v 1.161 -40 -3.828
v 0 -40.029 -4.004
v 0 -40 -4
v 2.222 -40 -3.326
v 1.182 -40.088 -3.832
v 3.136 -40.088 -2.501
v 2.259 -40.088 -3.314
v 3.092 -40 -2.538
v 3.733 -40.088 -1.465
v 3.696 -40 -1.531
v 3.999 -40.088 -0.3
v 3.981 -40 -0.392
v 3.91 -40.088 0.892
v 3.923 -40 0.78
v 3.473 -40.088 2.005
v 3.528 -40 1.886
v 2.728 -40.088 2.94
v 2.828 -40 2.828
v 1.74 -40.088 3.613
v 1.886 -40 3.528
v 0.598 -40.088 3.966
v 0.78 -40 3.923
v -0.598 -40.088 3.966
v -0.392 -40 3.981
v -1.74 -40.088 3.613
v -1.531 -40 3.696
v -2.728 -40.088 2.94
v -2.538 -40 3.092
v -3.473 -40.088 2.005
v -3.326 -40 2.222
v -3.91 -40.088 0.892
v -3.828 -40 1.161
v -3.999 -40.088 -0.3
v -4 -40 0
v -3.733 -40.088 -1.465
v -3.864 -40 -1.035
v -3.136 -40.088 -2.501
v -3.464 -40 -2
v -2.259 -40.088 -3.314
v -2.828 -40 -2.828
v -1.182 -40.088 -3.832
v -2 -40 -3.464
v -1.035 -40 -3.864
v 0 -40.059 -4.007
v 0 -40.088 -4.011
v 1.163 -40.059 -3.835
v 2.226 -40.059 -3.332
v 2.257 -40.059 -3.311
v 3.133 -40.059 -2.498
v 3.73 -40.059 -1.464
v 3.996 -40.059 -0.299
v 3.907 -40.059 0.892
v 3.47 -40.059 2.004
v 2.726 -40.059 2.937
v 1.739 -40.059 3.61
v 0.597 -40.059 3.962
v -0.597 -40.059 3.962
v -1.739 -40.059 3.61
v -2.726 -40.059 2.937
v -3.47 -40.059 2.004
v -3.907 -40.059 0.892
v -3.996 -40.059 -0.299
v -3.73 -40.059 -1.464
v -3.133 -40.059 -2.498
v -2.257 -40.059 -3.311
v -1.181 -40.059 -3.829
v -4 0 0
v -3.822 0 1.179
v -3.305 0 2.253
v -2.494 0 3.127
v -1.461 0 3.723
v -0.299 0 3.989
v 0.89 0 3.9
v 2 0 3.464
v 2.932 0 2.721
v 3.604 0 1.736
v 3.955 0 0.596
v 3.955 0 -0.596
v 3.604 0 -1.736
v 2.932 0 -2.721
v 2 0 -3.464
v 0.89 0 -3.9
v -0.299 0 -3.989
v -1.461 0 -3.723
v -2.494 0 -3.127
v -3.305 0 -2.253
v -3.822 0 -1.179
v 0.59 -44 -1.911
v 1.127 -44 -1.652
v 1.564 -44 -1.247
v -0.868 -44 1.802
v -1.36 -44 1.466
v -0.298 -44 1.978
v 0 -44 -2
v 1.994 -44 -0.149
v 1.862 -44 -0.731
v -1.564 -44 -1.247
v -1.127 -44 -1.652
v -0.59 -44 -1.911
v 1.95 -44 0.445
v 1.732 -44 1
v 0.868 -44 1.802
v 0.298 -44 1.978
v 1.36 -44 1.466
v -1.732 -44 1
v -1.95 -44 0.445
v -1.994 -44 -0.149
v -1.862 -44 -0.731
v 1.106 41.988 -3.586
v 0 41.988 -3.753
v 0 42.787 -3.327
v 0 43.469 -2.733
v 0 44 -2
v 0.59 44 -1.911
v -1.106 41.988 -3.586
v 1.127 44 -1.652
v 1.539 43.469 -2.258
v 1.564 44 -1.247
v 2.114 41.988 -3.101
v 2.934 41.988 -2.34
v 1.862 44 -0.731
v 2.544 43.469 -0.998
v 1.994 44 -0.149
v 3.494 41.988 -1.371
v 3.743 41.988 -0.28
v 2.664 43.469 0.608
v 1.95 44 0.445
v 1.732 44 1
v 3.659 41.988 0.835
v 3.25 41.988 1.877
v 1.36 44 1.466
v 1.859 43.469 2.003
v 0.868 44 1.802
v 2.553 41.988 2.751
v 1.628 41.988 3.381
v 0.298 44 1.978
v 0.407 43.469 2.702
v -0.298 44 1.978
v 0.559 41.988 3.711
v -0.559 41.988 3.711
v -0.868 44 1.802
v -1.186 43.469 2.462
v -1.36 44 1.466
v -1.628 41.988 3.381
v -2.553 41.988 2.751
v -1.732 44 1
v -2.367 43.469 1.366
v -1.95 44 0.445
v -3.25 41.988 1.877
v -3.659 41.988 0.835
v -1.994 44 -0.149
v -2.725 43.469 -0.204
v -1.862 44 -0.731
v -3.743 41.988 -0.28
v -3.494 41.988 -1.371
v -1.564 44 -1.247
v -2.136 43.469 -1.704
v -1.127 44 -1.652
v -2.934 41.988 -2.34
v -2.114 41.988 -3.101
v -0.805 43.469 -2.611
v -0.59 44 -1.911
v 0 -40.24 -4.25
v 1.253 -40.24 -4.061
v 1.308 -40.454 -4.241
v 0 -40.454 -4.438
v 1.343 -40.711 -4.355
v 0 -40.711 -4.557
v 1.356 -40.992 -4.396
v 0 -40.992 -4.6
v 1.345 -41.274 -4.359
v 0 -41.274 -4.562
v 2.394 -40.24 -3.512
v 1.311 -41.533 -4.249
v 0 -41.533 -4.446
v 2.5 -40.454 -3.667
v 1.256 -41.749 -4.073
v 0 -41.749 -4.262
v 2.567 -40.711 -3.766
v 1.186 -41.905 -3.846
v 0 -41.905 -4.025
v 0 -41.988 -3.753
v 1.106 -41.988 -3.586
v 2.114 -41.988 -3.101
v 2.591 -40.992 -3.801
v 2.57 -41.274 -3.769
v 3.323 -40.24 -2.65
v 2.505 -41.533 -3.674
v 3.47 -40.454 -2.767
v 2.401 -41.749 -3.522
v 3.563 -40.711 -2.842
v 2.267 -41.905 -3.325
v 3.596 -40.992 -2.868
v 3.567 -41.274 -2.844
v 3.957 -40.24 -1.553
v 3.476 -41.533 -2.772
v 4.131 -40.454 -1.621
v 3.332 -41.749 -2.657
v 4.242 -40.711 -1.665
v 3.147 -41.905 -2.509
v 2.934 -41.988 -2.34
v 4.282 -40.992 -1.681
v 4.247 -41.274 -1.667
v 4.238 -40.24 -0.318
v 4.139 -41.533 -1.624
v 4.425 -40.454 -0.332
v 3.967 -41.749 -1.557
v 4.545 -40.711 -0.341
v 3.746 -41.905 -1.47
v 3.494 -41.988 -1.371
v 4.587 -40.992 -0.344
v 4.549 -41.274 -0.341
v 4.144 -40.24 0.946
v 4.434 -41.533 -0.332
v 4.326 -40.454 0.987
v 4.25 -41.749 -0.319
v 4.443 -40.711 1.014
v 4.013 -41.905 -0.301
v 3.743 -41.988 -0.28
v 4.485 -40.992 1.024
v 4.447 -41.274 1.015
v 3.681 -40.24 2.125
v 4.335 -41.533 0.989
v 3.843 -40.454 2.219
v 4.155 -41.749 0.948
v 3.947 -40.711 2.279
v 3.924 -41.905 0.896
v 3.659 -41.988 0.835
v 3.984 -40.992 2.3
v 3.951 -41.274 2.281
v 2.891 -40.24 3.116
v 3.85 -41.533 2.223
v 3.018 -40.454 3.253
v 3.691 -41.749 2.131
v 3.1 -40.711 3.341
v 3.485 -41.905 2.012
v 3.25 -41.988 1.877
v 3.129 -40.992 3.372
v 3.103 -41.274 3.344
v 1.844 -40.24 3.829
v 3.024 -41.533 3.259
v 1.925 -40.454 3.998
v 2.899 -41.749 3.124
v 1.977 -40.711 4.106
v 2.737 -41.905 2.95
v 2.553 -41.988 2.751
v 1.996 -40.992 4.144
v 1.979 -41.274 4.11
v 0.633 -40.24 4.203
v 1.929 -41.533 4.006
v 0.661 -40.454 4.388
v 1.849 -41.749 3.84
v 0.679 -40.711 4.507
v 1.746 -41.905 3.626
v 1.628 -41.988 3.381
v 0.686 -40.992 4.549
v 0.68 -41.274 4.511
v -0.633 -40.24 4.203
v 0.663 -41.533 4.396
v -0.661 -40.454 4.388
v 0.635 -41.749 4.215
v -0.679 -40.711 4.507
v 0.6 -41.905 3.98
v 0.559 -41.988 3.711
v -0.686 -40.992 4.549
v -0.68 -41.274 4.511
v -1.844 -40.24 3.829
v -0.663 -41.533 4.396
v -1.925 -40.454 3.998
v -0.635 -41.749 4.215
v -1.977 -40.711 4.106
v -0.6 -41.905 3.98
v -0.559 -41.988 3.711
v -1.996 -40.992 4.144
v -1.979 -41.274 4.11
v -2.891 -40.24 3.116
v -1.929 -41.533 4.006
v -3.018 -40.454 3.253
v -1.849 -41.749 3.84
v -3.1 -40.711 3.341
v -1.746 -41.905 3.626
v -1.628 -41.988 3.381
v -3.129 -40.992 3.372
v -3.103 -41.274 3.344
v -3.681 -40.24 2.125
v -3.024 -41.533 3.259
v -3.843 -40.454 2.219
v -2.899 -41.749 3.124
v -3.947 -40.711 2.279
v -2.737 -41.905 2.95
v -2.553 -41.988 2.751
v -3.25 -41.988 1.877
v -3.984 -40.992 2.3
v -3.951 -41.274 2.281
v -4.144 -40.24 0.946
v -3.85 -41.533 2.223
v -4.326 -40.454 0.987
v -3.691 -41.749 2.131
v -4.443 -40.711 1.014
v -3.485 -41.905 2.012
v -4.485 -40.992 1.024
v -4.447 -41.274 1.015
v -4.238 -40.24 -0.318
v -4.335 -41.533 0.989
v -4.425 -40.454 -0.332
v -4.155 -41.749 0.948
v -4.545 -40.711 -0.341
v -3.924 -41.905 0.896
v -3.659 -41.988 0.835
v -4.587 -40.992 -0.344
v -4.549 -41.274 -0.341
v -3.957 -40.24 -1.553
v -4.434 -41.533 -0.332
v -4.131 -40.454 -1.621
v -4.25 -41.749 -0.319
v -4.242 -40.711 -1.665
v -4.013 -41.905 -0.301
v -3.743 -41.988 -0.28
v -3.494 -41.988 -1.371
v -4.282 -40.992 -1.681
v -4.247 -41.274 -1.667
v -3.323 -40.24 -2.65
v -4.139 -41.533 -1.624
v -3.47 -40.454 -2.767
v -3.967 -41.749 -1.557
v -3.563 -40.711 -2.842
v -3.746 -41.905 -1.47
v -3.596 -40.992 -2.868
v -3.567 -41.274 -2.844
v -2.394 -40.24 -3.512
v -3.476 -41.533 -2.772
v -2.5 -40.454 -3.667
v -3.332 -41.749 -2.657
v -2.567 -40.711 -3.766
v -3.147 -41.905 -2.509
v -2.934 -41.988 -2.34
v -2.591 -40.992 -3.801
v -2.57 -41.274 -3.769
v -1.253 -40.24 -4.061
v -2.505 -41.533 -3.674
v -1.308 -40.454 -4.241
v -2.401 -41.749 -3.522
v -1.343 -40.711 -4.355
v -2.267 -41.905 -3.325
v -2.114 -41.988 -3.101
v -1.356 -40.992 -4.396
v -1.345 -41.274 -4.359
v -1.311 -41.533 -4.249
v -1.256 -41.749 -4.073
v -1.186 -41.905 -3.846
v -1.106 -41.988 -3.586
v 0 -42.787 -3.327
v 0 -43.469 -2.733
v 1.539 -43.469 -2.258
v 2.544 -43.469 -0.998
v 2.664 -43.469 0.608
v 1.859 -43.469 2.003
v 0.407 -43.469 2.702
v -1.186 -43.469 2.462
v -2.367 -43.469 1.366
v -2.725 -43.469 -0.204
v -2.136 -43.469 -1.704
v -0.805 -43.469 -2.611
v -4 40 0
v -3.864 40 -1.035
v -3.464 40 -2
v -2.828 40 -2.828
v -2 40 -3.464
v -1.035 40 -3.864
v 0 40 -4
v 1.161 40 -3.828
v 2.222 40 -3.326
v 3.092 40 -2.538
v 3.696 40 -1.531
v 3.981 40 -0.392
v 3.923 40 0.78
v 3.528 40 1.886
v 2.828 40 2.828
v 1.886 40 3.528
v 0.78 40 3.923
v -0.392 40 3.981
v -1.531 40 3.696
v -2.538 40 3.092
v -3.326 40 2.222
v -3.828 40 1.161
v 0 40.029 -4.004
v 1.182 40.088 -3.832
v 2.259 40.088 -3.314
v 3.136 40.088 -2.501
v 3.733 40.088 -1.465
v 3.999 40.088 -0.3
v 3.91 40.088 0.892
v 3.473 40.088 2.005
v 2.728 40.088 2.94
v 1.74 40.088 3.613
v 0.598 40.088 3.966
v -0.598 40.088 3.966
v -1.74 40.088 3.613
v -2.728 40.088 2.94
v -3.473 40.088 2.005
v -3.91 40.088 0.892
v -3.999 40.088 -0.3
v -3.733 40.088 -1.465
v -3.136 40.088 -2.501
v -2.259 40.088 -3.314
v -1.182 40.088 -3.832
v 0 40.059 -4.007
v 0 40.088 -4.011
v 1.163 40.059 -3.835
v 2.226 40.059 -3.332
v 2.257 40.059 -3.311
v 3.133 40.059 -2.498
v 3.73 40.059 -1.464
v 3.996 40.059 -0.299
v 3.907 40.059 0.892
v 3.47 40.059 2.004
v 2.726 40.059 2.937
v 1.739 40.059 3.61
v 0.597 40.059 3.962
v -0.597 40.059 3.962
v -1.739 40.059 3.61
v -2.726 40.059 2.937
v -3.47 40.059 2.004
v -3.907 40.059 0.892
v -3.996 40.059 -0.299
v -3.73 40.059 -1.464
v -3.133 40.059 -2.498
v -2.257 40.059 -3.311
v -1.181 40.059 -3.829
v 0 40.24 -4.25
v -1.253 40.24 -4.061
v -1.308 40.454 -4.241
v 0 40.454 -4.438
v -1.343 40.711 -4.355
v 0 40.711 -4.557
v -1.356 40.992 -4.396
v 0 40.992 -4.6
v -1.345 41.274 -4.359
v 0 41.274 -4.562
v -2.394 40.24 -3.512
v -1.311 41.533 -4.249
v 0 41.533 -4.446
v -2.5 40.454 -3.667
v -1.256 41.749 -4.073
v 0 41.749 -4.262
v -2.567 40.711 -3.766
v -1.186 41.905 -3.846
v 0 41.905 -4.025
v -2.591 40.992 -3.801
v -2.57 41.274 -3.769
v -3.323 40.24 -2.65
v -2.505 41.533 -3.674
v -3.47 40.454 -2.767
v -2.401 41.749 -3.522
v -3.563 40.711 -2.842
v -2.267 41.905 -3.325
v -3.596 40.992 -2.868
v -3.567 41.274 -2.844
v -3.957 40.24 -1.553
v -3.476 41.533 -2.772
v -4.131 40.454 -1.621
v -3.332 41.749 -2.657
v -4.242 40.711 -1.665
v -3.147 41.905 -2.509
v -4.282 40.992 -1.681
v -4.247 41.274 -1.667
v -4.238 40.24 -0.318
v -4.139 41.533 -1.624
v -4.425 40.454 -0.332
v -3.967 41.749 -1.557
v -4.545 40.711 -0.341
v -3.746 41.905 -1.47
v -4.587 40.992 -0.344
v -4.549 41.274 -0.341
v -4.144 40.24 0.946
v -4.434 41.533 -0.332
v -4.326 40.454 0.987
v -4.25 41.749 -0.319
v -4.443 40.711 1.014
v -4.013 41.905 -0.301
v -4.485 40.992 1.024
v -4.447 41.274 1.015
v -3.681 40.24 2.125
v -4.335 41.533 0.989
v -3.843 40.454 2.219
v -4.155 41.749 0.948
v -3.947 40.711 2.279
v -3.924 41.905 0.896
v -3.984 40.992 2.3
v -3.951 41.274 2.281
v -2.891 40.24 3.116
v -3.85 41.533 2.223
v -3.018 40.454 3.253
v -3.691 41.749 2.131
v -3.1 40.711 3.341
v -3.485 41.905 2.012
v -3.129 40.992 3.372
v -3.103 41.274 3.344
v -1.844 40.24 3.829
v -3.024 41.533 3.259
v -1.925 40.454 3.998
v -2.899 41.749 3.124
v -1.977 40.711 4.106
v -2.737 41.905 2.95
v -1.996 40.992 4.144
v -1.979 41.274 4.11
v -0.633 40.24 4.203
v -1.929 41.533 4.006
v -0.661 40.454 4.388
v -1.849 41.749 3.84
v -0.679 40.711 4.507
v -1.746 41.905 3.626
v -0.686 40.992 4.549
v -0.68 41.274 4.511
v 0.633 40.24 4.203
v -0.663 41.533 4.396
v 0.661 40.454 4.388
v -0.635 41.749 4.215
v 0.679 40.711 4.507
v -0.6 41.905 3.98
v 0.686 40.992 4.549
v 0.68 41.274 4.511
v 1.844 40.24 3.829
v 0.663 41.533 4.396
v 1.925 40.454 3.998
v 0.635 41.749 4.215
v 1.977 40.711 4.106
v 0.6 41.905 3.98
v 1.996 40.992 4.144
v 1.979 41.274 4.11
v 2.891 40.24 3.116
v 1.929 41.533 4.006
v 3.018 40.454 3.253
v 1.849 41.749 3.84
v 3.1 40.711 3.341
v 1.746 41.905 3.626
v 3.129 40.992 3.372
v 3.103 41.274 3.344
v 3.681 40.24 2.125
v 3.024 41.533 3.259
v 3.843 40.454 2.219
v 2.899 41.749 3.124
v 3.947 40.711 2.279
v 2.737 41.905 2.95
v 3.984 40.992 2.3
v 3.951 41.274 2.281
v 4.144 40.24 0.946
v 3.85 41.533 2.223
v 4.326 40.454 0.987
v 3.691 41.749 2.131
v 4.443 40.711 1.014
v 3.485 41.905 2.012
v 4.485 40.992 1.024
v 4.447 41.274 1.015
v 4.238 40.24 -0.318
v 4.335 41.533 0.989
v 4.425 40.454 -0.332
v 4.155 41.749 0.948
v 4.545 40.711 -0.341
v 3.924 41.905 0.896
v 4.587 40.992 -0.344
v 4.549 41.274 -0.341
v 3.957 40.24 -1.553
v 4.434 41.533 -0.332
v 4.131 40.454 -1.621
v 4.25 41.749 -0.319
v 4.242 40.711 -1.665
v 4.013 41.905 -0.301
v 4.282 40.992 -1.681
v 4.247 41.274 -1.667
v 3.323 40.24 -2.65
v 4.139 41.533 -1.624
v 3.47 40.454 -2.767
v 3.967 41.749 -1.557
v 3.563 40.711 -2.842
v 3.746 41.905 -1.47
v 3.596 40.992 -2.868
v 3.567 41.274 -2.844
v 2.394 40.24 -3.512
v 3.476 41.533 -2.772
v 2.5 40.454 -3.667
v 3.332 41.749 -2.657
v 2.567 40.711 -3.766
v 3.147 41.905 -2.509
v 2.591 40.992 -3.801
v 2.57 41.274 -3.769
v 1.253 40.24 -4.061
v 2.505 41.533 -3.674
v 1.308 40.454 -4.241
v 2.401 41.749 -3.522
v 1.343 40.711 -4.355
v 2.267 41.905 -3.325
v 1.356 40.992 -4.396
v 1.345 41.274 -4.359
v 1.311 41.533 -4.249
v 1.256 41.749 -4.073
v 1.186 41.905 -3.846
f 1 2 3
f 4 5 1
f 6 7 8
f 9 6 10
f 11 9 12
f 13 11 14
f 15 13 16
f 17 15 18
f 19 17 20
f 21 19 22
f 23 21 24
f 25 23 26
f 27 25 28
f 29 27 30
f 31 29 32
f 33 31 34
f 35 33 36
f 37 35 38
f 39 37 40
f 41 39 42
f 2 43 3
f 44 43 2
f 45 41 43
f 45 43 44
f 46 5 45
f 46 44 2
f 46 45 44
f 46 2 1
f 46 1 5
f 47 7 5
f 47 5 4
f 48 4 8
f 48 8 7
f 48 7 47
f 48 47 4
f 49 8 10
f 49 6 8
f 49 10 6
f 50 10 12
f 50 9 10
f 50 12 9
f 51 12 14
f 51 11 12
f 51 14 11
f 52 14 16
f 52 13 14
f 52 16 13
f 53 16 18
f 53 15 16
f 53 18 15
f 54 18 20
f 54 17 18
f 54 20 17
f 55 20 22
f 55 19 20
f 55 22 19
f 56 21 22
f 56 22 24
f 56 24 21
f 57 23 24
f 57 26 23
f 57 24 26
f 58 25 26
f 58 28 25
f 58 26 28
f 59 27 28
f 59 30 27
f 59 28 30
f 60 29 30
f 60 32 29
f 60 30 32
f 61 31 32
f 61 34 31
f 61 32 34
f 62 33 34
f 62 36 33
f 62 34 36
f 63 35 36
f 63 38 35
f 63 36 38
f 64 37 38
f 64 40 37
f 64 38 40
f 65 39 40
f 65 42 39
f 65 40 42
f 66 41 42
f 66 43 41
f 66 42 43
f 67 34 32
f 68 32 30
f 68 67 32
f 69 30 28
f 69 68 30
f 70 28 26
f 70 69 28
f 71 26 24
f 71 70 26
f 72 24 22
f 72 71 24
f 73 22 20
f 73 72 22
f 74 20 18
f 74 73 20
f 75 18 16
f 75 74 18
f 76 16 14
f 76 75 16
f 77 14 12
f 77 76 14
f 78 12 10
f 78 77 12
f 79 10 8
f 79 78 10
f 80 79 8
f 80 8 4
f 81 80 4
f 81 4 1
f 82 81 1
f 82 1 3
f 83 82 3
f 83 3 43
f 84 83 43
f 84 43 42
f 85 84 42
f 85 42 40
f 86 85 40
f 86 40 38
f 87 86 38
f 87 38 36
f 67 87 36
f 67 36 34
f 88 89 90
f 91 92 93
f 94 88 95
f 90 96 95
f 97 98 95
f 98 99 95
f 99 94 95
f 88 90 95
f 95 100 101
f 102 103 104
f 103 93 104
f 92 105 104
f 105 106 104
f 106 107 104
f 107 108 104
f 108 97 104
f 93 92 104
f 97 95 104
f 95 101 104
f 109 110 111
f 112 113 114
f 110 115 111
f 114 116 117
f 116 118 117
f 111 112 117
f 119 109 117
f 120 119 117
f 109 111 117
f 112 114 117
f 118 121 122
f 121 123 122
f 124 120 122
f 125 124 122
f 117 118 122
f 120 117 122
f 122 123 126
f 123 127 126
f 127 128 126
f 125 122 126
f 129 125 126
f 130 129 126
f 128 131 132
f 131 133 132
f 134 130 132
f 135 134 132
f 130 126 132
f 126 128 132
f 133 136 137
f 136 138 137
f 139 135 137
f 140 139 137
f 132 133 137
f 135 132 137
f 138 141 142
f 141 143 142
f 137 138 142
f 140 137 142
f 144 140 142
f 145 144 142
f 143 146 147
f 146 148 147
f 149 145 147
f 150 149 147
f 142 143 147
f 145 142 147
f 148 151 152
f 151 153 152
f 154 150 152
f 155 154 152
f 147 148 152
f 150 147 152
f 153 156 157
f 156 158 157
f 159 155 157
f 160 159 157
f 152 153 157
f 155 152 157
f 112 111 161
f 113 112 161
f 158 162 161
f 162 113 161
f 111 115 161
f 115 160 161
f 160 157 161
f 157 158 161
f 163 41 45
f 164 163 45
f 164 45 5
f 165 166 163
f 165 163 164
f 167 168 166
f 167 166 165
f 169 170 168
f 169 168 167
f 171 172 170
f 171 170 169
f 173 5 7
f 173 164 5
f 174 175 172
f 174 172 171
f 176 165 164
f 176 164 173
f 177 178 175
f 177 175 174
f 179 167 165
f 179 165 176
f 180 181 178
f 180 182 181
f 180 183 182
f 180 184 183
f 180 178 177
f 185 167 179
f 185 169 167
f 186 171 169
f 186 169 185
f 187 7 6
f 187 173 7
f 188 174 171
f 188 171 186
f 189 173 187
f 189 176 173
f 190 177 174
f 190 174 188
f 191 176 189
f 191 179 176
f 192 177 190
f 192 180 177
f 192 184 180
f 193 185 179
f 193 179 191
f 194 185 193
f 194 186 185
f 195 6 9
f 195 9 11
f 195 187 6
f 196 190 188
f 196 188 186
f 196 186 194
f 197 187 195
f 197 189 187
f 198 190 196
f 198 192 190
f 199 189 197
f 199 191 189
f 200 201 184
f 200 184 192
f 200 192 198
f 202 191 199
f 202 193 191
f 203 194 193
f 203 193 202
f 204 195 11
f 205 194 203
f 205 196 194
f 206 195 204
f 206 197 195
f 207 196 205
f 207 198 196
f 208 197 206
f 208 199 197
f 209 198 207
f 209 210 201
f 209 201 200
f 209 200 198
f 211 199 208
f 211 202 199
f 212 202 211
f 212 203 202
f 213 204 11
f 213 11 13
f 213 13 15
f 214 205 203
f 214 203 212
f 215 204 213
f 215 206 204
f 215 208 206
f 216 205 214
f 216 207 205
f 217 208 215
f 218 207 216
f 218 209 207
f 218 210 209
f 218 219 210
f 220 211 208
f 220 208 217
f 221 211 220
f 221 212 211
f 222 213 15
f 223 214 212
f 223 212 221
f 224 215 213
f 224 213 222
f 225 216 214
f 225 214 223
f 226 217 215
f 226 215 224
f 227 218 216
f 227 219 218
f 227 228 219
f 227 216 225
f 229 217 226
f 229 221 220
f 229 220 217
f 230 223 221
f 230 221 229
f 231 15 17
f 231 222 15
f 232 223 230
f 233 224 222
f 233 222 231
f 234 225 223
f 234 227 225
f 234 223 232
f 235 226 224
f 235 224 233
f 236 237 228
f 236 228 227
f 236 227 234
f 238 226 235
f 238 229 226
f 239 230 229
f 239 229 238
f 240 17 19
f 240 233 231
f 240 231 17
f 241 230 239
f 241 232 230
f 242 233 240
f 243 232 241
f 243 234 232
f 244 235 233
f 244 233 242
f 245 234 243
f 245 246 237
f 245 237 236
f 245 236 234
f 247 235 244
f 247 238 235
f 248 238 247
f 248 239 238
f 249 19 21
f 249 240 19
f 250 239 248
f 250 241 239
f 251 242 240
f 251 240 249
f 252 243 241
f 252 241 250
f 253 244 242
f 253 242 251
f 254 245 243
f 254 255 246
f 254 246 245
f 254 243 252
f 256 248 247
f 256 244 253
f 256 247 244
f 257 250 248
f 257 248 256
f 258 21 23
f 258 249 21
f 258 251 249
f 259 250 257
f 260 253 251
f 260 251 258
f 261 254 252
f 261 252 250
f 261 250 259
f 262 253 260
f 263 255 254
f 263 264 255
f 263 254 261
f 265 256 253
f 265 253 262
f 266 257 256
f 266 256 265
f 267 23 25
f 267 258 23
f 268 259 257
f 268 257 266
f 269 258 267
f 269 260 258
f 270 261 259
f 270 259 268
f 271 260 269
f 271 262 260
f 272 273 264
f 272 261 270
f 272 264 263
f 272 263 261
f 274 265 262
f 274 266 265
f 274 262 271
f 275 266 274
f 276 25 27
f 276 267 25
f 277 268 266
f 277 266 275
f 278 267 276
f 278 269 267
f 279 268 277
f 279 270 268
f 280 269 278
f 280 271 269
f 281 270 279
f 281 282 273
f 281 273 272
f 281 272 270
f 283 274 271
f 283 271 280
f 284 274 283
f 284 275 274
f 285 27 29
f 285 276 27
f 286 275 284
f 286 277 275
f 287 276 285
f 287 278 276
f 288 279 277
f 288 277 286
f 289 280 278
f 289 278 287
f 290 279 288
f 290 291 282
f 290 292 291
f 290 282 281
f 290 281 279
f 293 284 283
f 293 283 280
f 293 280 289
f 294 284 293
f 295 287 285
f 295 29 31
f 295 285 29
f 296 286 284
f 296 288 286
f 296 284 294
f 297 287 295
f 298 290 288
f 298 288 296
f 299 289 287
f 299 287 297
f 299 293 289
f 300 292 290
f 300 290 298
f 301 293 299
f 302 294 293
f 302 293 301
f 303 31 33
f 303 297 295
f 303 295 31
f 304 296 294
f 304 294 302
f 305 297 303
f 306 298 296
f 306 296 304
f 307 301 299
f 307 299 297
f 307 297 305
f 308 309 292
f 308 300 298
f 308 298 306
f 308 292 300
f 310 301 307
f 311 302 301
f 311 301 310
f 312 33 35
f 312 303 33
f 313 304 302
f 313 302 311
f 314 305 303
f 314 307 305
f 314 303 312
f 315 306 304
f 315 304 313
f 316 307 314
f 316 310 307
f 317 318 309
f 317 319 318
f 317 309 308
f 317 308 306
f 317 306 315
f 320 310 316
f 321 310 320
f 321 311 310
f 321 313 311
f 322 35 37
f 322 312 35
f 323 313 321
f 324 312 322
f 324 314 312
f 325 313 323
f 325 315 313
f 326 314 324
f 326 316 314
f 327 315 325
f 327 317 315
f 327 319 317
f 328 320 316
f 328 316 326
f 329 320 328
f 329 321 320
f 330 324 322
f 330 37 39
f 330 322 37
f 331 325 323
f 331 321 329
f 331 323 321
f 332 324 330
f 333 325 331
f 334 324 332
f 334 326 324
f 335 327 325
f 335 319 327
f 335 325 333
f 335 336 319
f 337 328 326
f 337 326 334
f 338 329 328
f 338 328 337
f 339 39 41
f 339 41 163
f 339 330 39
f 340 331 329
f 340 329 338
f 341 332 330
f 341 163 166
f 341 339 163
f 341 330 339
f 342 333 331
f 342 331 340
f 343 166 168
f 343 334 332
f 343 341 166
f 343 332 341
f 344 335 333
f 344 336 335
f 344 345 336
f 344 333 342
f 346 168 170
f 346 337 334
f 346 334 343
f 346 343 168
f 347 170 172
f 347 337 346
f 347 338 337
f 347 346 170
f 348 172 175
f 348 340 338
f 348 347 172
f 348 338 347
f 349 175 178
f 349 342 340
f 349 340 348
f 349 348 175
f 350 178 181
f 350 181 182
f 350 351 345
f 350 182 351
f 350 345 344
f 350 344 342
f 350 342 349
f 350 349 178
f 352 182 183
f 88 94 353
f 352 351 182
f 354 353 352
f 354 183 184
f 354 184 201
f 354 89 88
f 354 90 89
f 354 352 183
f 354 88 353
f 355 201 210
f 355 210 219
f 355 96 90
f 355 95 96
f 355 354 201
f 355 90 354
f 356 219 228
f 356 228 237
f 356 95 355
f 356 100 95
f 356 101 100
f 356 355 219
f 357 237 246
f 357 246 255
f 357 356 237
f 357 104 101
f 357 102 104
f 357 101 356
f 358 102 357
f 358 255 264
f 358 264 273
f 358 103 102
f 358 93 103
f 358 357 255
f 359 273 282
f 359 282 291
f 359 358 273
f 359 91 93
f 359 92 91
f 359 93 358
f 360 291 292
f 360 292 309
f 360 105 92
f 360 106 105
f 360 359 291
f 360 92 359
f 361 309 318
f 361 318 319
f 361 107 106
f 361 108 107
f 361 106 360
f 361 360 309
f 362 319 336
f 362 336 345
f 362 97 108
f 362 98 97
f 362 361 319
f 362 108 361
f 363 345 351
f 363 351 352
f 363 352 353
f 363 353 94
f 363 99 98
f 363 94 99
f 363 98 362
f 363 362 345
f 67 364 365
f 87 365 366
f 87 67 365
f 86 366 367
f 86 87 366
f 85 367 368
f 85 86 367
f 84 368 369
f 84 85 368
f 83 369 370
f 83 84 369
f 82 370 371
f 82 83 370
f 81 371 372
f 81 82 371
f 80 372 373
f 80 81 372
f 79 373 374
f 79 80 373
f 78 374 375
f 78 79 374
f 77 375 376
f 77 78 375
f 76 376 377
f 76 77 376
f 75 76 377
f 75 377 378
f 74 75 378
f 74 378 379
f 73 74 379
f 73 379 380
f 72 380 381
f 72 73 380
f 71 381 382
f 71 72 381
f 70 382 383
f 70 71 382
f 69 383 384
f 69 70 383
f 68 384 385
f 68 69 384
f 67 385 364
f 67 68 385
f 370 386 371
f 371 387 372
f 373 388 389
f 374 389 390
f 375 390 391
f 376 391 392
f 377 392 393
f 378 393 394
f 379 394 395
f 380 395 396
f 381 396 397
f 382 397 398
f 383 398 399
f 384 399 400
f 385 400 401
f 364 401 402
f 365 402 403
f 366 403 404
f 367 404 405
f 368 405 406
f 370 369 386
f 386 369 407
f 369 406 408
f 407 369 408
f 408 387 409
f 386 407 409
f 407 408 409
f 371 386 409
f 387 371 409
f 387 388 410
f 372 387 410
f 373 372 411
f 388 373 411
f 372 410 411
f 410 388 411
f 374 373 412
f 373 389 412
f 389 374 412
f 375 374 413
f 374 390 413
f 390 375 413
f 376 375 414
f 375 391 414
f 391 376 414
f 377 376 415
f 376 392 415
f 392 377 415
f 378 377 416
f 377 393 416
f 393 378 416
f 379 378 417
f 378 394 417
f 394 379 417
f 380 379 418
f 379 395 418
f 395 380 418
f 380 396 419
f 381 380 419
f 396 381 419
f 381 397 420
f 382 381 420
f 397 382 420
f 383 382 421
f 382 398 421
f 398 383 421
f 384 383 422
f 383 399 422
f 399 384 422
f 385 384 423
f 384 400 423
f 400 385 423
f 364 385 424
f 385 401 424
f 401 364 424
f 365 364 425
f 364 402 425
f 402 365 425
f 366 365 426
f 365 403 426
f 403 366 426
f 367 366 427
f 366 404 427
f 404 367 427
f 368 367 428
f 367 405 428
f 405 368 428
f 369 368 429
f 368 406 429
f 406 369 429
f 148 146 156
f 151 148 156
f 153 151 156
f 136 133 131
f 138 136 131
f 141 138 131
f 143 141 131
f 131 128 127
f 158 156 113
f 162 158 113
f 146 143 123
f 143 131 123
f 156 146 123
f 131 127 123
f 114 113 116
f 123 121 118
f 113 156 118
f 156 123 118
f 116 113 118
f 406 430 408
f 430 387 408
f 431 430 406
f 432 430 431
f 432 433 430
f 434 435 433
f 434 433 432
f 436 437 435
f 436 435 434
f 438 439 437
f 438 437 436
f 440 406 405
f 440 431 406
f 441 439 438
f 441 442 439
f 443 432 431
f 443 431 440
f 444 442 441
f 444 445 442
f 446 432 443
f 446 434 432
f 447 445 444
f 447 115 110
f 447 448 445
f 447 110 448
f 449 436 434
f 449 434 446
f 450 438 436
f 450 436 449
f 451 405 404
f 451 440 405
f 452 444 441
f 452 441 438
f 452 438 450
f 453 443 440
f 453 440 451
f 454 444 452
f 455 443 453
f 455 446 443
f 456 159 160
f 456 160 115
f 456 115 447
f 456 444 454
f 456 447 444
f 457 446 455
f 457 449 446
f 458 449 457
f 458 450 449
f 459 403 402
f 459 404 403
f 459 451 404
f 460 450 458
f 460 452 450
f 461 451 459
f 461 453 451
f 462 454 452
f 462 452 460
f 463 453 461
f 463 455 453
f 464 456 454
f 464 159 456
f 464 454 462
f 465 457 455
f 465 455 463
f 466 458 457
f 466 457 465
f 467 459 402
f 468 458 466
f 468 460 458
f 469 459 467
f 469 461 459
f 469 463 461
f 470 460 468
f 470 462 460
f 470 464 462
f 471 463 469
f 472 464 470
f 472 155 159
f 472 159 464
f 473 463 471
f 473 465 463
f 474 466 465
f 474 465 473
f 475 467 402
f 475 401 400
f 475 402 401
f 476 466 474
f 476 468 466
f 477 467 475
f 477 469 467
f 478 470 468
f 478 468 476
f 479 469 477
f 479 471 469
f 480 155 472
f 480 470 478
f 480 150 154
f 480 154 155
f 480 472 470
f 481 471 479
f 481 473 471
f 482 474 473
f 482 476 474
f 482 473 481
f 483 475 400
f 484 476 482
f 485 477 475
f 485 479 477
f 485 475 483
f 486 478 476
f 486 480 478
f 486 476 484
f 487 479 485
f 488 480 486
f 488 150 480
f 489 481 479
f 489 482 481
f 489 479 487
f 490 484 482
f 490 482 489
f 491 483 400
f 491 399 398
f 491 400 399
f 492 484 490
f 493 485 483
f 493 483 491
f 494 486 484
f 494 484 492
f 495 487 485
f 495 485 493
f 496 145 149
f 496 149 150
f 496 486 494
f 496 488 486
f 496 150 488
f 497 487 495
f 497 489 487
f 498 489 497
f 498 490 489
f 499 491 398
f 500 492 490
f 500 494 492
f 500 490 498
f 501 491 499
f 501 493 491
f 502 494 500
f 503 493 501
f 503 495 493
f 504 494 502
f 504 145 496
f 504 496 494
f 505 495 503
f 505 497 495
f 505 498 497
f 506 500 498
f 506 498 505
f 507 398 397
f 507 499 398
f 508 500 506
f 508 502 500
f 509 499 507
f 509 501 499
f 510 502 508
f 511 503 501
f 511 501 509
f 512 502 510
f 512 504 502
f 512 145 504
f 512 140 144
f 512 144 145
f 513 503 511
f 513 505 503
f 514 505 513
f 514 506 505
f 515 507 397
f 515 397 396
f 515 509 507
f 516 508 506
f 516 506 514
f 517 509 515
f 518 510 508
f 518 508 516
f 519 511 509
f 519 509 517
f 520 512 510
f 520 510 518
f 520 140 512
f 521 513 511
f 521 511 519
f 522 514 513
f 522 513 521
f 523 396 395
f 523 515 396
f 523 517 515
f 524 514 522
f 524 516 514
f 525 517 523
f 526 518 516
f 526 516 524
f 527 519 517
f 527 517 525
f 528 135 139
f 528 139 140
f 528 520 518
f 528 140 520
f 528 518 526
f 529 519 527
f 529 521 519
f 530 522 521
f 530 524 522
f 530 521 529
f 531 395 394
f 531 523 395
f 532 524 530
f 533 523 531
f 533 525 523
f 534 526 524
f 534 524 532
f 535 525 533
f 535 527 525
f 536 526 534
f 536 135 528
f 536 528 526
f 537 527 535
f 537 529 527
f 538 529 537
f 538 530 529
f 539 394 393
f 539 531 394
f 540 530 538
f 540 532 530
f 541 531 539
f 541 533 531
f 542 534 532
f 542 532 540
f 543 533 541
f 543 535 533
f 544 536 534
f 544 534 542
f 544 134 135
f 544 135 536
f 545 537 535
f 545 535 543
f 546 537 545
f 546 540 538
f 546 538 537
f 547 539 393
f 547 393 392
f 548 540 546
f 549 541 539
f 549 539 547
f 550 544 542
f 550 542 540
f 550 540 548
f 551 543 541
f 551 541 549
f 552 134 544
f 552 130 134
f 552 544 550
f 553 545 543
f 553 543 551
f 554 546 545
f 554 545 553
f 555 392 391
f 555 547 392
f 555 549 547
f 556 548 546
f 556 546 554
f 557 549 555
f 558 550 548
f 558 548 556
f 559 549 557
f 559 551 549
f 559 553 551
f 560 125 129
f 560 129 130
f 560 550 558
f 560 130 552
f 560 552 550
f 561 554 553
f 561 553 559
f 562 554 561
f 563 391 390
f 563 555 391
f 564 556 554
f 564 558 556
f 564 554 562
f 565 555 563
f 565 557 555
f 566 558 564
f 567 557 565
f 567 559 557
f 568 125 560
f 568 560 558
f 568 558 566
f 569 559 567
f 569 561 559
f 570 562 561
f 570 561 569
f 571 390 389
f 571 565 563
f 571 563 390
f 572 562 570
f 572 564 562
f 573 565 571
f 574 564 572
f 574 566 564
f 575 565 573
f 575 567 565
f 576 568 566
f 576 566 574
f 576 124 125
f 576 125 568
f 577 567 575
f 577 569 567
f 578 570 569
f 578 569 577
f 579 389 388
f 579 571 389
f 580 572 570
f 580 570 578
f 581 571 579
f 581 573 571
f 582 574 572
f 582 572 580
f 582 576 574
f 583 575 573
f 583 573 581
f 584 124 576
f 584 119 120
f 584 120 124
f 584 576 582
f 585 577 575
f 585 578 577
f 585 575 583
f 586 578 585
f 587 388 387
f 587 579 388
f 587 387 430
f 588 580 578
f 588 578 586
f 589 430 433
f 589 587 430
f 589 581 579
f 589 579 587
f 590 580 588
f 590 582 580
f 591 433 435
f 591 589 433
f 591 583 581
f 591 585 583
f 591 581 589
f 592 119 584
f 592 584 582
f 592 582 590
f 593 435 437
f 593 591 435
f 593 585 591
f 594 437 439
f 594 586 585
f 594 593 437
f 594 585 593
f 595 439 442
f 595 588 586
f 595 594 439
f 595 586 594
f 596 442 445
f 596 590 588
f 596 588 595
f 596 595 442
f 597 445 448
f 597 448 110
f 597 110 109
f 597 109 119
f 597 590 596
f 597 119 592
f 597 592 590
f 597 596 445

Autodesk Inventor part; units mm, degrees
ref_plane "YZ Plane" through (0, 0, 0) normal (1, 0, 0) x (0, 1, 0)
ref_plane "XZ Plane" through (0, 0, 0) normal (0, 1, 0) x (-1, 0, 0)
ref_plane "XY Plane" through (0, 0, 0) normal (0, 0, 1) x (1, 0, 0)
sketch "Boceto1" plane through (0, 0, 0) normal (0, 1, 0) x (-1, 0, 0)
  circle A0 centre (0, 0) radius 4
  dimension "d0" = 8
extrude "Extrusión1" add sketch "Boceto1" along normal mid plane 80
sketch "Boceto2" plane through (0, 0, 0) normal (1, 0, 0) x (0, 1, 0)
  line L0 (44, 0) -> (44, -2)
  line L1 (44, 0) -> (40, 0)
  line L2 (40, -4) -> (40, 4) projected
  line L3 (40, 0) -> (40, -3.6)
  arc A0 (40.0881, -4.0105) -> (41.9882, -3.753) centre (41, -3.6) ccw
  arc A1 (40, -4) -> (40.0881, -4.0105) centre (40.5168, -0.0335) ccw
  arc A2 (41.9882, -3.753) -> (44, -2) centre (40.5168, -0.0335) ccw
  point P0 (0, 0)
  dimension "d4" = 4
  dimension "d6" = 2
  dimension "d8" = 0.4
revolve "Revolución1" add sketch "Boceto2" angle 360 about axis through (0, 44, 0) along (0, -1, 0)
mirror "Simetría1" about plane through (0, 0, 0) normal (0, 1, 0) of "Revolución1"
properties part number "Eje-Bisagra" material "Acero inoxidable"
